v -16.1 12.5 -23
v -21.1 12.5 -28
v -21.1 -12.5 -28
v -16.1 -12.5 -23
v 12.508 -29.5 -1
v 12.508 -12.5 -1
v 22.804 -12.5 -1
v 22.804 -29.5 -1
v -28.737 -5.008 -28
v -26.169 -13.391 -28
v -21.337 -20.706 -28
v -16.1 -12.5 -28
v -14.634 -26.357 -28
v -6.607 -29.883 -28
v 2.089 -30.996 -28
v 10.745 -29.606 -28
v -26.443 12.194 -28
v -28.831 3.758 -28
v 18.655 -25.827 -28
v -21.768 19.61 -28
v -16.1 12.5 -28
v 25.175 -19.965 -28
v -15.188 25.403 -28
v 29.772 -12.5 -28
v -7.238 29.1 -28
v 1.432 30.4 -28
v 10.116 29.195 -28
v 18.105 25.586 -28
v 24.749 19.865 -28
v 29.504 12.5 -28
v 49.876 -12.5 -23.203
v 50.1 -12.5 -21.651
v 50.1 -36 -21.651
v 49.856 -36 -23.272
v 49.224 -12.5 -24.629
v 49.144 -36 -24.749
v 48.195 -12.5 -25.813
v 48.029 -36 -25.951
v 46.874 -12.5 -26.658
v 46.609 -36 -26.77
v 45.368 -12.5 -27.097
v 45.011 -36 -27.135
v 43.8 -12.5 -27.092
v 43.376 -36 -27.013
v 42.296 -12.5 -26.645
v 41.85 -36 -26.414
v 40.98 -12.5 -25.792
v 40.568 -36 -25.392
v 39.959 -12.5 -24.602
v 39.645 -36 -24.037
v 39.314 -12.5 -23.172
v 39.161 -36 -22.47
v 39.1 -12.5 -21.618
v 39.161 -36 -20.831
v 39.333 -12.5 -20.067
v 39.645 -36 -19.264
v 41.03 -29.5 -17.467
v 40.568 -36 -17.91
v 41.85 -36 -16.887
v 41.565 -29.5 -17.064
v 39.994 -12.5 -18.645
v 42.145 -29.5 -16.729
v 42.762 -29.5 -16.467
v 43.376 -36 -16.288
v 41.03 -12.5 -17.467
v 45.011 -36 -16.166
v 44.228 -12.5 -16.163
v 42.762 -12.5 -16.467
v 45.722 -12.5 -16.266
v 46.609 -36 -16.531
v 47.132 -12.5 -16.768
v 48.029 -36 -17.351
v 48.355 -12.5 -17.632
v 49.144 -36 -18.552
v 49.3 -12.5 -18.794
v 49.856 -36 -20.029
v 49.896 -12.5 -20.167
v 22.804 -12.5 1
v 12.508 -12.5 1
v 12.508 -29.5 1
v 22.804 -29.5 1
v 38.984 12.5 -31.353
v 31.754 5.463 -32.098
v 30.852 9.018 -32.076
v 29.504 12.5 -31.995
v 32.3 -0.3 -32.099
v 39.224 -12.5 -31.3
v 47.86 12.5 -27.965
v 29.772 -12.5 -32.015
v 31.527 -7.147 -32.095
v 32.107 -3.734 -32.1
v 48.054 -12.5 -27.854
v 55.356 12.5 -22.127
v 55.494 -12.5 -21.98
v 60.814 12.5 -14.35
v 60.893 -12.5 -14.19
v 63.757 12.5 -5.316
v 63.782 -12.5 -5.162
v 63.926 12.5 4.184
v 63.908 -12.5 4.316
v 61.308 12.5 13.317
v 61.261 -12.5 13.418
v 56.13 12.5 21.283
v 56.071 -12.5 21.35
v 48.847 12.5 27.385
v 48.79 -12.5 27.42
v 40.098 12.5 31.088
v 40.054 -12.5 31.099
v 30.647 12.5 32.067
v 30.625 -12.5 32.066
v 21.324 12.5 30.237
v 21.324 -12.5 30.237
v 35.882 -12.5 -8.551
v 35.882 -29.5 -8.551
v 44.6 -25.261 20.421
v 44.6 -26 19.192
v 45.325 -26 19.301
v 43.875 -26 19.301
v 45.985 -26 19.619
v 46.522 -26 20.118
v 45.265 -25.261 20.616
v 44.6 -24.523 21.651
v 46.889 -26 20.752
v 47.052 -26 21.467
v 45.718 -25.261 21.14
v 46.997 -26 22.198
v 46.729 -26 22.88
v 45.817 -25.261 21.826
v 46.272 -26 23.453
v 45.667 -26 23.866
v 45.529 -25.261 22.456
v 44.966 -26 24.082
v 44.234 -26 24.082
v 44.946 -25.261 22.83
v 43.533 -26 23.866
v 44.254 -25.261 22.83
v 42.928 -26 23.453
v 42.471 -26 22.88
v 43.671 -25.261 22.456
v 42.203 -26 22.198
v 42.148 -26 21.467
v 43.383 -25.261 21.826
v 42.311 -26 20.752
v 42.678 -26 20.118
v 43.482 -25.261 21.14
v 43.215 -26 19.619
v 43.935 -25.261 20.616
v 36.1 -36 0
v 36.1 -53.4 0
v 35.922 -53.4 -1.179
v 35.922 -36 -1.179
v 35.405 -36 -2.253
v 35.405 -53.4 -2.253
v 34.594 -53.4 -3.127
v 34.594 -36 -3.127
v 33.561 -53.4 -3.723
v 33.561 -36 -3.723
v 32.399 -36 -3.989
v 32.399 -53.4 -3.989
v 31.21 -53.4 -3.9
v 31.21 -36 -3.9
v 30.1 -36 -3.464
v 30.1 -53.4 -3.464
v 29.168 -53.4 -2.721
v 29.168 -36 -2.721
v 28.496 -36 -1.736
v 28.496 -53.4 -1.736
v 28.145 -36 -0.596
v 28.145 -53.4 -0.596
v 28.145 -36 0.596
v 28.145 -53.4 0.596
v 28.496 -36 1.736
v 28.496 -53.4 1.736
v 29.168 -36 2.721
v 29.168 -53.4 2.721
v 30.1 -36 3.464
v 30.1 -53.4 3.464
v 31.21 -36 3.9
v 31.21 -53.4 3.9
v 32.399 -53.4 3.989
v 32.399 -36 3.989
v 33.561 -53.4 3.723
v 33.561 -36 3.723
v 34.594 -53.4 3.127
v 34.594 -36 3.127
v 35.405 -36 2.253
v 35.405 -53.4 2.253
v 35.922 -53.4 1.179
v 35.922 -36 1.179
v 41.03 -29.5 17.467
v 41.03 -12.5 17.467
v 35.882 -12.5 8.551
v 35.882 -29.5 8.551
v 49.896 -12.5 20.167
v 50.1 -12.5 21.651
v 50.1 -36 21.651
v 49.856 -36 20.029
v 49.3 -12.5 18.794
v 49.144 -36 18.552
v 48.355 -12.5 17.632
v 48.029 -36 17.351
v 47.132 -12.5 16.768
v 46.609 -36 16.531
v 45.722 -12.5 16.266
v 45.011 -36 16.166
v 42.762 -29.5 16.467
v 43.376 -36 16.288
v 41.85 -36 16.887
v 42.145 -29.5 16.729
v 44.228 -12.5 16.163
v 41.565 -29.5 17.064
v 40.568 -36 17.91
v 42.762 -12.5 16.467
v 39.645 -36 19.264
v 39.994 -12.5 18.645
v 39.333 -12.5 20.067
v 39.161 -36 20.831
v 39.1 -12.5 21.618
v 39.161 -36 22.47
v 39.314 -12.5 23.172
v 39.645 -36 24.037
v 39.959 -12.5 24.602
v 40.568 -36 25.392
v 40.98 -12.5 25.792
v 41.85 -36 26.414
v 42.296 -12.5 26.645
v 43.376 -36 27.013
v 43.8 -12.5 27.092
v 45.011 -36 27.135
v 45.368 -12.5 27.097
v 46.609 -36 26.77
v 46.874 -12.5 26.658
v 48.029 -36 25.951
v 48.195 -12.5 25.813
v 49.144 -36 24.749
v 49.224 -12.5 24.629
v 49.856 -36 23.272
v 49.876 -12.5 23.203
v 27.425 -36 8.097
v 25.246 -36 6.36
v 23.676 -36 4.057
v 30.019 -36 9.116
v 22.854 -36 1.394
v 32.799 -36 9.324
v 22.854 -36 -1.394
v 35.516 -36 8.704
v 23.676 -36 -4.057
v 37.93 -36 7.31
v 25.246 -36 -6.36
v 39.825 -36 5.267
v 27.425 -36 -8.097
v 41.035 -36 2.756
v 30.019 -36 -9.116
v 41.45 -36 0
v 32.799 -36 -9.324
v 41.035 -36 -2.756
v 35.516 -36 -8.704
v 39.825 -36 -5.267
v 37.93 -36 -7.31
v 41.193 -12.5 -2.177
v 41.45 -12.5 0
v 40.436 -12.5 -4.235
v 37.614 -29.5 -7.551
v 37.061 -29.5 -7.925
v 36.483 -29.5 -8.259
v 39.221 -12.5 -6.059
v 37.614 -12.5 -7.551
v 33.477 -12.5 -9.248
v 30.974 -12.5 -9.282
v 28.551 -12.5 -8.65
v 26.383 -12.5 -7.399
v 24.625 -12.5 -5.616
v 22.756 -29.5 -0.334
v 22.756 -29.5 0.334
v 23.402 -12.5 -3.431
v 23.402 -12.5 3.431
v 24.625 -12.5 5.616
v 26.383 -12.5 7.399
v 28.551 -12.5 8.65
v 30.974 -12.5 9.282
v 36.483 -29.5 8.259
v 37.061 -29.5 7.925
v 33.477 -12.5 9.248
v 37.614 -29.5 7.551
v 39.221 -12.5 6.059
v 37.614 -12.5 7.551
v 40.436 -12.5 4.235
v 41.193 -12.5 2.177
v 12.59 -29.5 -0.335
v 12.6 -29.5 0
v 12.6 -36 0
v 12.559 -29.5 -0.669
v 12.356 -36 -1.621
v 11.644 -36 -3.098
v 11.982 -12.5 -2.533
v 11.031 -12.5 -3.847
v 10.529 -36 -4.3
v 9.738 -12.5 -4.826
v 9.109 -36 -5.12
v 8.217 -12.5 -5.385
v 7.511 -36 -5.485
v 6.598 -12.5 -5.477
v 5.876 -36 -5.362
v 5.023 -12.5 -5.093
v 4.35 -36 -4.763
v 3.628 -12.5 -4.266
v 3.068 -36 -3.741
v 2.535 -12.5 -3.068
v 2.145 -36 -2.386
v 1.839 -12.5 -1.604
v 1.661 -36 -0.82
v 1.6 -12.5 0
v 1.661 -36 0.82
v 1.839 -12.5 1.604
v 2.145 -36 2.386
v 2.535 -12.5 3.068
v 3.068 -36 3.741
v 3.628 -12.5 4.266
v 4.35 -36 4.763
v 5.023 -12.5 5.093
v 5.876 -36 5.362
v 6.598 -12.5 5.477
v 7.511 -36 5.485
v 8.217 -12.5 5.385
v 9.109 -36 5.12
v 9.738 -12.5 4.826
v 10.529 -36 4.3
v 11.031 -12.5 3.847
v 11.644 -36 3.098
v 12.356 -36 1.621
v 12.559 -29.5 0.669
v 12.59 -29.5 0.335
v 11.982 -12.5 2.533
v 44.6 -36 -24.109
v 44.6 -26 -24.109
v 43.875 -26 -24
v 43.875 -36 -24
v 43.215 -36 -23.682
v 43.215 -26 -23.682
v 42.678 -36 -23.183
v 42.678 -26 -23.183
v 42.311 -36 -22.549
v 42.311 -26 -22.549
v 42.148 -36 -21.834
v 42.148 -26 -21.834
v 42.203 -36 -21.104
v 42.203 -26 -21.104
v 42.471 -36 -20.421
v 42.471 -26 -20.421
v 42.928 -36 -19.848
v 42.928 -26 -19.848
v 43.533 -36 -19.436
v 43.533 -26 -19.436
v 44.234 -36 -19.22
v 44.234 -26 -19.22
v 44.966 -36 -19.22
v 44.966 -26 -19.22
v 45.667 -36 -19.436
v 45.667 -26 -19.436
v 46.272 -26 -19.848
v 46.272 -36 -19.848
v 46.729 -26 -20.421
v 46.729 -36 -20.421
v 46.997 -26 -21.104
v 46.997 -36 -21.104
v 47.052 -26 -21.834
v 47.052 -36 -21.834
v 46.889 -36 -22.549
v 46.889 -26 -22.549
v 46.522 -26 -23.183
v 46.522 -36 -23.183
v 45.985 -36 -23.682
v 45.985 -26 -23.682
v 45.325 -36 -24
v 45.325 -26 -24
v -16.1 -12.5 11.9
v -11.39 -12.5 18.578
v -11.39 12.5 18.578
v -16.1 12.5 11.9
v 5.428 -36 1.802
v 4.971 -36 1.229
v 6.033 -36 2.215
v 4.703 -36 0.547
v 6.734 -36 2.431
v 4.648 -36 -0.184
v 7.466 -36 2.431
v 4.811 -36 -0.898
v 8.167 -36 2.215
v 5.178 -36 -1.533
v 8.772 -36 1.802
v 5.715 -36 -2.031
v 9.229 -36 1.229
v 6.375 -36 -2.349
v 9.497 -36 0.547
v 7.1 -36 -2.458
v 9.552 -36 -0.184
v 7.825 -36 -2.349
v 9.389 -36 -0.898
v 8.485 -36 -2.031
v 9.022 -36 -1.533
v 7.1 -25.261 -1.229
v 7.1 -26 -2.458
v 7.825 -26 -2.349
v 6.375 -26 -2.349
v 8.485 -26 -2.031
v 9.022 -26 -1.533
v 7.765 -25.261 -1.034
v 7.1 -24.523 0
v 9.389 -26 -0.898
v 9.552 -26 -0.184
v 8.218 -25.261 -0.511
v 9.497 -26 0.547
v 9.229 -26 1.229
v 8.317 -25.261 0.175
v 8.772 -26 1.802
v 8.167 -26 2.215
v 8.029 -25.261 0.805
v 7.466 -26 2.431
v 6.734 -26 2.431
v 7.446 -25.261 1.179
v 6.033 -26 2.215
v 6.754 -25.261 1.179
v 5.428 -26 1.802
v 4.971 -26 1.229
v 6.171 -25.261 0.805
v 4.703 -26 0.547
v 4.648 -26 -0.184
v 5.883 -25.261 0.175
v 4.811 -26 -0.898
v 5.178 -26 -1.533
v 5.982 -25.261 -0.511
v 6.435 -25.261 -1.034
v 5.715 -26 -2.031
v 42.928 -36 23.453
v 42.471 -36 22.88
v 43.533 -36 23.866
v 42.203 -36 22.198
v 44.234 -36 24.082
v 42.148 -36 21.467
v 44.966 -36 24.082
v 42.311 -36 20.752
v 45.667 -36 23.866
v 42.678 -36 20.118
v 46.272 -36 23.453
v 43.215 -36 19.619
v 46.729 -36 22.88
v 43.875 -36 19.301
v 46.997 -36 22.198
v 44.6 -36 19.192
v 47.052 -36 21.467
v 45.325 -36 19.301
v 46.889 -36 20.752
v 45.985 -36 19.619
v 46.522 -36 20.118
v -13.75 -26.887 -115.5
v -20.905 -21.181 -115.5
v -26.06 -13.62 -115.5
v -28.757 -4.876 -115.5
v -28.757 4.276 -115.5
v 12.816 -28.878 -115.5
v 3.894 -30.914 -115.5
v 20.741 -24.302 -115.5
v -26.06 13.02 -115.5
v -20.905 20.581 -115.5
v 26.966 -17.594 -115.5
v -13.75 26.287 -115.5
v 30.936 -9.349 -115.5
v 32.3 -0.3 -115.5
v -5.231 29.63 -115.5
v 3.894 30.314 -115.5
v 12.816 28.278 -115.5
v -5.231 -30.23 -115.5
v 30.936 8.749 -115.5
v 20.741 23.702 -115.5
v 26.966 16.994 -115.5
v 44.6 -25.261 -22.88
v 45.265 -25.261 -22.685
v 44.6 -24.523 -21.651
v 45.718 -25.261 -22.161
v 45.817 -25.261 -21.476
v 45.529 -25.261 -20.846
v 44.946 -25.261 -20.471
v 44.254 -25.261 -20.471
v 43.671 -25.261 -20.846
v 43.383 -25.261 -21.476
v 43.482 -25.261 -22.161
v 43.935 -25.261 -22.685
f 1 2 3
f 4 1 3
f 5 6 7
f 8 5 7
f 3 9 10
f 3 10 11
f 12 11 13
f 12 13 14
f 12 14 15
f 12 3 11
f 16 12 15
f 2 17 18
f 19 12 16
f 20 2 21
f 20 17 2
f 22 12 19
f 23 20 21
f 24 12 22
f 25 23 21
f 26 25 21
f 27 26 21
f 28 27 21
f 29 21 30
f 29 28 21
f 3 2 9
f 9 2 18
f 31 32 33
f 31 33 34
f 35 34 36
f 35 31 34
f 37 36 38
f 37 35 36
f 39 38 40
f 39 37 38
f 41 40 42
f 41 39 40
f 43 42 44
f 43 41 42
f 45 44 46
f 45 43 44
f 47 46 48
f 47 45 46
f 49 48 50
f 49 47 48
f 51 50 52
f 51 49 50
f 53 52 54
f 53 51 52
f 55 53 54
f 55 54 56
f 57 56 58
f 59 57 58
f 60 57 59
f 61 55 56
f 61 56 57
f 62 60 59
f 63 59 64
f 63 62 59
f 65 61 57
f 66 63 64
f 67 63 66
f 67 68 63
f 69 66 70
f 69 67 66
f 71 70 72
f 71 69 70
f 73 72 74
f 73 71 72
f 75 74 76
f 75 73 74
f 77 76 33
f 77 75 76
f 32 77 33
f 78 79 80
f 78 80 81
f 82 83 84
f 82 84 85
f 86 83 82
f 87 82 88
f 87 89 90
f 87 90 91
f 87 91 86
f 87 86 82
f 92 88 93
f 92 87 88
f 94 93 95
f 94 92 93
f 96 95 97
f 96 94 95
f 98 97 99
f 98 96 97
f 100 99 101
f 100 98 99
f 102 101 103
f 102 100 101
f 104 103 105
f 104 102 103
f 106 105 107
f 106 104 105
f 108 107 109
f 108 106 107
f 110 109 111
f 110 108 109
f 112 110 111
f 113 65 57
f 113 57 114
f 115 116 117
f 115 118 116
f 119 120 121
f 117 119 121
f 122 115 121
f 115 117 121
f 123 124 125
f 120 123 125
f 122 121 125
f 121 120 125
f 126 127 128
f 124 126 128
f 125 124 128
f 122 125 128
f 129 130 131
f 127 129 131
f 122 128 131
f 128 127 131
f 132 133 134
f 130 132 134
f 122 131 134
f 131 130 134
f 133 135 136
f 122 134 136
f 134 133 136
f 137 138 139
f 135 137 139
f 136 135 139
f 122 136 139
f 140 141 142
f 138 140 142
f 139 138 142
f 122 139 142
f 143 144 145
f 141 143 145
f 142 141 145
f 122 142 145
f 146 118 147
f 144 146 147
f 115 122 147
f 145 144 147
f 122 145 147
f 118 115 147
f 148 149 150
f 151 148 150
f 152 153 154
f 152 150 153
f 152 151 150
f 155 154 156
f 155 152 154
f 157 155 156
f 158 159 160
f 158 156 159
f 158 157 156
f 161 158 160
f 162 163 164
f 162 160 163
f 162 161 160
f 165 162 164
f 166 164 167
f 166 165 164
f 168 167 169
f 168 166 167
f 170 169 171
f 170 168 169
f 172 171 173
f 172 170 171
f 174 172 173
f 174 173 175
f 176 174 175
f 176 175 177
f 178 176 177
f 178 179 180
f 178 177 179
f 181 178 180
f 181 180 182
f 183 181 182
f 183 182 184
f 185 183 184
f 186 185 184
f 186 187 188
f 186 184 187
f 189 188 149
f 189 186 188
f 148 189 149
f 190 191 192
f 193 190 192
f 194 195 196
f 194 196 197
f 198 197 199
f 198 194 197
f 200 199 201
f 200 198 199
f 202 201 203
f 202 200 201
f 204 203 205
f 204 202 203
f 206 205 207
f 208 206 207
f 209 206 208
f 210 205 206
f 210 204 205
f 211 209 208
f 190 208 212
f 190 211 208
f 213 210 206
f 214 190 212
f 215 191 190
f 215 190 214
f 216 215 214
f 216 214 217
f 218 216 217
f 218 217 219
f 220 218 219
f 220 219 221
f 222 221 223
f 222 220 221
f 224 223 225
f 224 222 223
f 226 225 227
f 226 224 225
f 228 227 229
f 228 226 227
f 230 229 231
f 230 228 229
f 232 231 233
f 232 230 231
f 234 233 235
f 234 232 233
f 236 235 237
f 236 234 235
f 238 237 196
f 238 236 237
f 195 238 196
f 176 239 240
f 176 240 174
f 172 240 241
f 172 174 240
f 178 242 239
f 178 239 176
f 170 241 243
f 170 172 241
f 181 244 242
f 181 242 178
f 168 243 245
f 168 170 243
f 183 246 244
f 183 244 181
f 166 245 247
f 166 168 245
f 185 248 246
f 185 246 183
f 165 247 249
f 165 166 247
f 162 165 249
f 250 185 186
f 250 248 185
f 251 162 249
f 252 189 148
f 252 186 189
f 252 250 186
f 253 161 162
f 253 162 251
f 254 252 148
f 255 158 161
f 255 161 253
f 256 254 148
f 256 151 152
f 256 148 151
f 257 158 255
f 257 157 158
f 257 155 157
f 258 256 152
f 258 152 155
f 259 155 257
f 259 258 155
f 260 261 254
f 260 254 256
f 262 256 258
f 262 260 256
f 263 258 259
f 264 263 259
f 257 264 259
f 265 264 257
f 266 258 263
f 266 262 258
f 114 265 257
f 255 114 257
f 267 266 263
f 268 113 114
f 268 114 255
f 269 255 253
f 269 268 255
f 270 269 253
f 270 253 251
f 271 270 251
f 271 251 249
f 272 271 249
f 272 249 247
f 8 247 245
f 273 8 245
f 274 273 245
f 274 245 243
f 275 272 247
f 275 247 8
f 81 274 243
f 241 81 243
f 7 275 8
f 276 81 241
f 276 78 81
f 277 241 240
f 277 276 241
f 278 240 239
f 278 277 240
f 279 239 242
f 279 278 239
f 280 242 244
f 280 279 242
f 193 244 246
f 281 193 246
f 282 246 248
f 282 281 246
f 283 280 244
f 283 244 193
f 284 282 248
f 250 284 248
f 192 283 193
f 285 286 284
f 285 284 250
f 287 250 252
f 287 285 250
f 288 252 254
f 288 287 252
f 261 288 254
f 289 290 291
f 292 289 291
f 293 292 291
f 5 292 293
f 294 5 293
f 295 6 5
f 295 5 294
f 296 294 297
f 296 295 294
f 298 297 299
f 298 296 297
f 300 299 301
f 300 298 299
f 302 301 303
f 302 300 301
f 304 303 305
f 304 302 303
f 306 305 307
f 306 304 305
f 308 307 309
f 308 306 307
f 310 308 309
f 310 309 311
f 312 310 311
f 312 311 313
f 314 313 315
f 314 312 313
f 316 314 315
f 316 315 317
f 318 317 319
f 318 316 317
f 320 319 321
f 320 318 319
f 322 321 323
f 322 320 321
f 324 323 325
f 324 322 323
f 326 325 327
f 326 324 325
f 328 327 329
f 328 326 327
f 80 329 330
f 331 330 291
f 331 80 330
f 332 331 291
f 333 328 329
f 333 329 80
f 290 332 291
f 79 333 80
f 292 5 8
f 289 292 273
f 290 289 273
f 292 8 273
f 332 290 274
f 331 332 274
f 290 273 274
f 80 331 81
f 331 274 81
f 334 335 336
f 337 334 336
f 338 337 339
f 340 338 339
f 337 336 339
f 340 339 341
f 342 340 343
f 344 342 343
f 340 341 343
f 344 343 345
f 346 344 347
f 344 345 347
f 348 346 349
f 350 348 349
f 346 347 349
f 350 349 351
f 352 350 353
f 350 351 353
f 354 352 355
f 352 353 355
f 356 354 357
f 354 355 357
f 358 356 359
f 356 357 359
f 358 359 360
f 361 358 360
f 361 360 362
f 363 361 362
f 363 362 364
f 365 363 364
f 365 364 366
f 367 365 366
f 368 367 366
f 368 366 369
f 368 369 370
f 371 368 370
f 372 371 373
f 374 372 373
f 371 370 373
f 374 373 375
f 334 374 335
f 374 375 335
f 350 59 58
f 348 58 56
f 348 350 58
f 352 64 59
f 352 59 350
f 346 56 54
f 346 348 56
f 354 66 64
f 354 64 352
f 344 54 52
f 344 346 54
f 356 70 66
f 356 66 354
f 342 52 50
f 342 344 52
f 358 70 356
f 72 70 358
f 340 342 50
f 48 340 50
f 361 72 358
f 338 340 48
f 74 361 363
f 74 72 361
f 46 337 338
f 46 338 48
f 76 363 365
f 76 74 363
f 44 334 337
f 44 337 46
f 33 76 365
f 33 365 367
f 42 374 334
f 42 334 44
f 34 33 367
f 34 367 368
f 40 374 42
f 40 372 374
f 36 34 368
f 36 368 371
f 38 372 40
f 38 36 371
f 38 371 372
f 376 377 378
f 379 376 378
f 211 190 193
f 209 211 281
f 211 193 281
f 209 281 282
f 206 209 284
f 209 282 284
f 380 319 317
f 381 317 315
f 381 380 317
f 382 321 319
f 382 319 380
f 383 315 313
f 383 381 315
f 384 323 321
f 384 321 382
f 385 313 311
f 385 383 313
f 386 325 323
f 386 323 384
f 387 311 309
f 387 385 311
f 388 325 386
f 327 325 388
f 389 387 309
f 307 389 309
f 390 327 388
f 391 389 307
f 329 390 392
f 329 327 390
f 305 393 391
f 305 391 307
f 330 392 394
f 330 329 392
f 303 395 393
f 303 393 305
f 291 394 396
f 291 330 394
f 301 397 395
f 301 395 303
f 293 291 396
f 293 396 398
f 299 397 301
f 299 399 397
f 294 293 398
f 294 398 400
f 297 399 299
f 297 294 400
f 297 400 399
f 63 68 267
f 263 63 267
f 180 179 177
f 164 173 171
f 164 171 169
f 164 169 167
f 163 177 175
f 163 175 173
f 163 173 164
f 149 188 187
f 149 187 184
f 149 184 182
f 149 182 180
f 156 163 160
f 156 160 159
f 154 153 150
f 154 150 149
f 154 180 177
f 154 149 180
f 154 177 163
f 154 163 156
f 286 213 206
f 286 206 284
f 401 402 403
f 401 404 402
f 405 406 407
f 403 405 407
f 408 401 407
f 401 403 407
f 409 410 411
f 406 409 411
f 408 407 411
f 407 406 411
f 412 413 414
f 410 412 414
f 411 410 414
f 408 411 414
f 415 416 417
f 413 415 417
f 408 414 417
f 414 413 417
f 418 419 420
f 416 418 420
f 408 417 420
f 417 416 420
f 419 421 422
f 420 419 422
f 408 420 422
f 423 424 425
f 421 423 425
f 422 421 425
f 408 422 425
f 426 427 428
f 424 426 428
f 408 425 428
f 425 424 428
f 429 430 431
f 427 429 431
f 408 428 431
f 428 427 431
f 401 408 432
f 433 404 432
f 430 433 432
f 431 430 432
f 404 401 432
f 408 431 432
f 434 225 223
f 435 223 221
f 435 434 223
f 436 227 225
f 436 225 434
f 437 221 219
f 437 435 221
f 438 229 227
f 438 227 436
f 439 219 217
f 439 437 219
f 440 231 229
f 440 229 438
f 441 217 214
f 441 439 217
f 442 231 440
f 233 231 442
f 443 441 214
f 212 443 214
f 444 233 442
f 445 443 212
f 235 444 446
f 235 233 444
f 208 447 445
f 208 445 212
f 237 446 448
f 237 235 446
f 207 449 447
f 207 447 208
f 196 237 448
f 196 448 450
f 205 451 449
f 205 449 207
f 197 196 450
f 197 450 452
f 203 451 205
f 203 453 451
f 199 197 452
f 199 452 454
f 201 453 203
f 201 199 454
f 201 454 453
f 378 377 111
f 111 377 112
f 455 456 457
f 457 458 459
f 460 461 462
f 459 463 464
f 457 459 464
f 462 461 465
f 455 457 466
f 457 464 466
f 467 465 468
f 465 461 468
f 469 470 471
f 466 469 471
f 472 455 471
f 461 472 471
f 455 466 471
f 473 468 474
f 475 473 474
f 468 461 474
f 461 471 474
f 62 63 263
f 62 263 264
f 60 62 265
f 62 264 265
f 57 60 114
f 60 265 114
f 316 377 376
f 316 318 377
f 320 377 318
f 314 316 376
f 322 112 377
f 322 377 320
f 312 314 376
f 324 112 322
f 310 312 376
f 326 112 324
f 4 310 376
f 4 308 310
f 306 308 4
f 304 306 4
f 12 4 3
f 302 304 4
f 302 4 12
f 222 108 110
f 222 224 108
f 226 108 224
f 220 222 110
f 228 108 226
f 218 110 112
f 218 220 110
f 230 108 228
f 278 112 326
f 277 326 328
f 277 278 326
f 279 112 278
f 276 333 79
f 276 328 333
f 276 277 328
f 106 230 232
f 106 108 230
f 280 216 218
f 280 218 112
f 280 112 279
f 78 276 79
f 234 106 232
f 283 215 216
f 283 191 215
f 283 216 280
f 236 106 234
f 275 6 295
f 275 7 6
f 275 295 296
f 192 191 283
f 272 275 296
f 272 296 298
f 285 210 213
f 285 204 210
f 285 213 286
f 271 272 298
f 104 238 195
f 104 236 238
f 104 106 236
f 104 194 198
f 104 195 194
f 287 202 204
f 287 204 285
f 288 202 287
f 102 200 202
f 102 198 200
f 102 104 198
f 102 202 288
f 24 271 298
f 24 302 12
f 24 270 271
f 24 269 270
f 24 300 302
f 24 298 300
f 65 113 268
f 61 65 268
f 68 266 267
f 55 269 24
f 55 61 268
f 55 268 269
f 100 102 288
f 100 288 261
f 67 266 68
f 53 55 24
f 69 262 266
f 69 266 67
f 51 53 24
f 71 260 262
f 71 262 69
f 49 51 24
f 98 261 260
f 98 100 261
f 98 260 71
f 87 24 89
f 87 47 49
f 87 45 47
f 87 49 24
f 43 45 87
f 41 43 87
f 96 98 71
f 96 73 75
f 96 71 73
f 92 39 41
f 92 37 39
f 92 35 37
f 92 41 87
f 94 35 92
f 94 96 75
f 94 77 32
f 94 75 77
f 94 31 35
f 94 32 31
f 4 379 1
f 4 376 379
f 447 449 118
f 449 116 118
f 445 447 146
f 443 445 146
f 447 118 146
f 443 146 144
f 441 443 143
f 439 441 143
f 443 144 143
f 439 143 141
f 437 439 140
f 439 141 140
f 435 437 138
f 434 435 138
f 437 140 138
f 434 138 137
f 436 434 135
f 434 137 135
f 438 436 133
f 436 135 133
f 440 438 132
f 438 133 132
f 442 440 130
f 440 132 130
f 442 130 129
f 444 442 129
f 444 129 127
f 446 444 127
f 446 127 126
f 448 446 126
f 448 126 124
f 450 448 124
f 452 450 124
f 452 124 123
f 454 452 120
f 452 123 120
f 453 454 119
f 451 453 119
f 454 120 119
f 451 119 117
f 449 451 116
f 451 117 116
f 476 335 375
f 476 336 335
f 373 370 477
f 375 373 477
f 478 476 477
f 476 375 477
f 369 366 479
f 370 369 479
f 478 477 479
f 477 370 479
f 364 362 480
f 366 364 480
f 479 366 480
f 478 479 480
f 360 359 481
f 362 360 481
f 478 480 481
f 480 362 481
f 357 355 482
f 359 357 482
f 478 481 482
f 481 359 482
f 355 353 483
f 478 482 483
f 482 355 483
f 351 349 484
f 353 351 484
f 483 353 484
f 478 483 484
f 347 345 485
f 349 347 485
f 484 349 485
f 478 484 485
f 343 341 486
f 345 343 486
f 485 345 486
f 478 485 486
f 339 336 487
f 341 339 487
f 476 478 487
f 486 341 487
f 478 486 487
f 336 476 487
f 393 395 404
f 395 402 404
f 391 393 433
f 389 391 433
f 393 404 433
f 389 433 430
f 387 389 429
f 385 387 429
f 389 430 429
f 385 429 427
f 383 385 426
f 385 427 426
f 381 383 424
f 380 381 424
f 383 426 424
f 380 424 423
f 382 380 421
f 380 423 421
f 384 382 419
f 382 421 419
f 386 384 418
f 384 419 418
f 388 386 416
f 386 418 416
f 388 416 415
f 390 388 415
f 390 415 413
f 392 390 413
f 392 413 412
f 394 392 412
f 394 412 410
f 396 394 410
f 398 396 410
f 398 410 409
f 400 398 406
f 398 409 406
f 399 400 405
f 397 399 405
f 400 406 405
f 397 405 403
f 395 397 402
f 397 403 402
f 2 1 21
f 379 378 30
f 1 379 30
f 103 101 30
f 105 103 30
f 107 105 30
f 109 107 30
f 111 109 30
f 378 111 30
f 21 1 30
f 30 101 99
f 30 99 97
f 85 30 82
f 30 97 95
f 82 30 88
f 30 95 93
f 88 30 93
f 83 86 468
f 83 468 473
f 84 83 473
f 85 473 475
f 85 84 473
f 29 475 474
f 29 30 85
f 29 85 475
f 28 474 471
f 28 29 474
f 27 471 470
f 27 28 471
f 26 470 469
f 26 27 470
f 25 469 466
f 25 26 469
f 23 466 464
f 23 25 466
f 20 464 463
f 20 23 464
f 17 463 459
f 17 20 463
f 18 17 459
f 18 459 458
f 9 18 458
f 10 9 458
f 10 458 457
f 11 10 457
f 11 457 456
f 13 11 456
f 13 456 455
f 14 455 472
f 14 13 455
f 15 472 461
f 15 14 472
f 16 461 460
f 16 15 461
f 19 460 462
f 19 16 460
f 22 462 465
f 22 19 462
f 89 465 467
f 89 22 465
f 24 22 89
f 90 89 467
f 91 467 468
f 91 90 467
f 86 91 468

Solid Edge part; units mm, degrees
sketch "Sketch1" plane through (0, 0, 0) normal (0, -1, 0) x (1, 0, 0)
  line L0 (-16.1, 16.9) -> (-16.1, -29.1)
  line L1 (18.5501, -29.1) -> (-16.1, -29.1)
  line L2 (-16.1, 16.9) -> (21.324, 30.2372)
  arc A0 (18.5501, -29.1) -> (21.324, 30.2372) centre (32.1, 0) ccw
  dimension "D1" = 64.2
  dimension "D2" = 80.3
  dimension "D3" = 3
  dimension "D4" = 46
  dimension "D5" = 15.2
  dimension "D6" = 32.1
extrude "Extrusionsausprägung_1" add sketch "Sketch1" against normal blind 12.5 and the other way blind 12.5
sketch "Sketch2" plane through (24.05, -12.5, 0) normal (0, -1, 0) x (1, 0, 0)
  circle A0 centre (8.05, 0) radius 9.35
  circle A1 centre (20.55, 21.6506) radius 5.5
  circle A2 centre (20.55, -21.6506) radius 5.5
  circle A3 centre (-16.95, 0) radius 5.5
  dimension "D1" = 25
  dimension "D2" = 11
  dimension "D3" = 18.7
extrude "Extrusionsausprägung_2" add sketch "Sketch2" along normal blind 23.5
sketch "Sketch3" plane through (32.1, -36, 0) normal (0, -1, 0) x (1, 0, 0)
  circle A0 centre (0, 0) radius 4
  dimension "D1" = 8
extrude "Extrusionsausprägung_3" add sketch "Sketch3" along normal blind 17.4
sketch "Sketch4" plane through (24.05, -12.5, 0) normal (0, -1, 0) x (1, 0, 0)
  line L0 (-11.5417, 1) -> (-1.2464, 1)
  line L1 (-11.5417, -1) -> (-1.2464, -1)
  arc A0 (-11.5417, -1) -> (-11.5417, 1) centre (-16.95, 0) ccw
  arc A1 (-1.2464, 1) -> (-1.2464, -1) centre (8.05, 0) ccw
extrude "Extrusionsausprägung_4" add sketch "Sketch4" along normal blind 17
pattern_circular "Pattern1" count 3 over 360 about axis through (32.1, -12.5, 0) along (0, 1, 0) of "Extrusionsausprägung_4"
cosmetic_thread "Thread1" size "M8"
hole "Bohrung_1" at (7.1, -36, 0) direction (0, 1, 0) diameter 4.917 depth 10 tip angle 118 thread major 6 thread length 8
hole "Hole1" at (44.6, -36, 21.6506) direction (0, 1, 0) diameter 4.917 depth 10 tip angle 118 thread major 6 thread length 8
hole "Hole2" at (44.6, -36, -21.6506) direction (0, 1, 0) diameter 4.917 depth 10 tip angle 118 thread major 6 thread length 8
sketch "Sketch5" plane through (0, 0, -28) normal (0, 0, 1) x (1, 0, 0)
  circle A0 centre (1.6, -0.3) radius 30.7
  dimension "D1" = 5
  dimension "D2" = 61.4
extrude "Extrusionsausprägung_7" add sketch "Sketch5" against normal blind 87.5
chamfer "Fase_1" distance 5 angle 45 1 edges at (-16.1, 0, 16.9)
chamfer "Fase_2" distance 5 angle 45 1 edges at (-16.1, 0, -28)
